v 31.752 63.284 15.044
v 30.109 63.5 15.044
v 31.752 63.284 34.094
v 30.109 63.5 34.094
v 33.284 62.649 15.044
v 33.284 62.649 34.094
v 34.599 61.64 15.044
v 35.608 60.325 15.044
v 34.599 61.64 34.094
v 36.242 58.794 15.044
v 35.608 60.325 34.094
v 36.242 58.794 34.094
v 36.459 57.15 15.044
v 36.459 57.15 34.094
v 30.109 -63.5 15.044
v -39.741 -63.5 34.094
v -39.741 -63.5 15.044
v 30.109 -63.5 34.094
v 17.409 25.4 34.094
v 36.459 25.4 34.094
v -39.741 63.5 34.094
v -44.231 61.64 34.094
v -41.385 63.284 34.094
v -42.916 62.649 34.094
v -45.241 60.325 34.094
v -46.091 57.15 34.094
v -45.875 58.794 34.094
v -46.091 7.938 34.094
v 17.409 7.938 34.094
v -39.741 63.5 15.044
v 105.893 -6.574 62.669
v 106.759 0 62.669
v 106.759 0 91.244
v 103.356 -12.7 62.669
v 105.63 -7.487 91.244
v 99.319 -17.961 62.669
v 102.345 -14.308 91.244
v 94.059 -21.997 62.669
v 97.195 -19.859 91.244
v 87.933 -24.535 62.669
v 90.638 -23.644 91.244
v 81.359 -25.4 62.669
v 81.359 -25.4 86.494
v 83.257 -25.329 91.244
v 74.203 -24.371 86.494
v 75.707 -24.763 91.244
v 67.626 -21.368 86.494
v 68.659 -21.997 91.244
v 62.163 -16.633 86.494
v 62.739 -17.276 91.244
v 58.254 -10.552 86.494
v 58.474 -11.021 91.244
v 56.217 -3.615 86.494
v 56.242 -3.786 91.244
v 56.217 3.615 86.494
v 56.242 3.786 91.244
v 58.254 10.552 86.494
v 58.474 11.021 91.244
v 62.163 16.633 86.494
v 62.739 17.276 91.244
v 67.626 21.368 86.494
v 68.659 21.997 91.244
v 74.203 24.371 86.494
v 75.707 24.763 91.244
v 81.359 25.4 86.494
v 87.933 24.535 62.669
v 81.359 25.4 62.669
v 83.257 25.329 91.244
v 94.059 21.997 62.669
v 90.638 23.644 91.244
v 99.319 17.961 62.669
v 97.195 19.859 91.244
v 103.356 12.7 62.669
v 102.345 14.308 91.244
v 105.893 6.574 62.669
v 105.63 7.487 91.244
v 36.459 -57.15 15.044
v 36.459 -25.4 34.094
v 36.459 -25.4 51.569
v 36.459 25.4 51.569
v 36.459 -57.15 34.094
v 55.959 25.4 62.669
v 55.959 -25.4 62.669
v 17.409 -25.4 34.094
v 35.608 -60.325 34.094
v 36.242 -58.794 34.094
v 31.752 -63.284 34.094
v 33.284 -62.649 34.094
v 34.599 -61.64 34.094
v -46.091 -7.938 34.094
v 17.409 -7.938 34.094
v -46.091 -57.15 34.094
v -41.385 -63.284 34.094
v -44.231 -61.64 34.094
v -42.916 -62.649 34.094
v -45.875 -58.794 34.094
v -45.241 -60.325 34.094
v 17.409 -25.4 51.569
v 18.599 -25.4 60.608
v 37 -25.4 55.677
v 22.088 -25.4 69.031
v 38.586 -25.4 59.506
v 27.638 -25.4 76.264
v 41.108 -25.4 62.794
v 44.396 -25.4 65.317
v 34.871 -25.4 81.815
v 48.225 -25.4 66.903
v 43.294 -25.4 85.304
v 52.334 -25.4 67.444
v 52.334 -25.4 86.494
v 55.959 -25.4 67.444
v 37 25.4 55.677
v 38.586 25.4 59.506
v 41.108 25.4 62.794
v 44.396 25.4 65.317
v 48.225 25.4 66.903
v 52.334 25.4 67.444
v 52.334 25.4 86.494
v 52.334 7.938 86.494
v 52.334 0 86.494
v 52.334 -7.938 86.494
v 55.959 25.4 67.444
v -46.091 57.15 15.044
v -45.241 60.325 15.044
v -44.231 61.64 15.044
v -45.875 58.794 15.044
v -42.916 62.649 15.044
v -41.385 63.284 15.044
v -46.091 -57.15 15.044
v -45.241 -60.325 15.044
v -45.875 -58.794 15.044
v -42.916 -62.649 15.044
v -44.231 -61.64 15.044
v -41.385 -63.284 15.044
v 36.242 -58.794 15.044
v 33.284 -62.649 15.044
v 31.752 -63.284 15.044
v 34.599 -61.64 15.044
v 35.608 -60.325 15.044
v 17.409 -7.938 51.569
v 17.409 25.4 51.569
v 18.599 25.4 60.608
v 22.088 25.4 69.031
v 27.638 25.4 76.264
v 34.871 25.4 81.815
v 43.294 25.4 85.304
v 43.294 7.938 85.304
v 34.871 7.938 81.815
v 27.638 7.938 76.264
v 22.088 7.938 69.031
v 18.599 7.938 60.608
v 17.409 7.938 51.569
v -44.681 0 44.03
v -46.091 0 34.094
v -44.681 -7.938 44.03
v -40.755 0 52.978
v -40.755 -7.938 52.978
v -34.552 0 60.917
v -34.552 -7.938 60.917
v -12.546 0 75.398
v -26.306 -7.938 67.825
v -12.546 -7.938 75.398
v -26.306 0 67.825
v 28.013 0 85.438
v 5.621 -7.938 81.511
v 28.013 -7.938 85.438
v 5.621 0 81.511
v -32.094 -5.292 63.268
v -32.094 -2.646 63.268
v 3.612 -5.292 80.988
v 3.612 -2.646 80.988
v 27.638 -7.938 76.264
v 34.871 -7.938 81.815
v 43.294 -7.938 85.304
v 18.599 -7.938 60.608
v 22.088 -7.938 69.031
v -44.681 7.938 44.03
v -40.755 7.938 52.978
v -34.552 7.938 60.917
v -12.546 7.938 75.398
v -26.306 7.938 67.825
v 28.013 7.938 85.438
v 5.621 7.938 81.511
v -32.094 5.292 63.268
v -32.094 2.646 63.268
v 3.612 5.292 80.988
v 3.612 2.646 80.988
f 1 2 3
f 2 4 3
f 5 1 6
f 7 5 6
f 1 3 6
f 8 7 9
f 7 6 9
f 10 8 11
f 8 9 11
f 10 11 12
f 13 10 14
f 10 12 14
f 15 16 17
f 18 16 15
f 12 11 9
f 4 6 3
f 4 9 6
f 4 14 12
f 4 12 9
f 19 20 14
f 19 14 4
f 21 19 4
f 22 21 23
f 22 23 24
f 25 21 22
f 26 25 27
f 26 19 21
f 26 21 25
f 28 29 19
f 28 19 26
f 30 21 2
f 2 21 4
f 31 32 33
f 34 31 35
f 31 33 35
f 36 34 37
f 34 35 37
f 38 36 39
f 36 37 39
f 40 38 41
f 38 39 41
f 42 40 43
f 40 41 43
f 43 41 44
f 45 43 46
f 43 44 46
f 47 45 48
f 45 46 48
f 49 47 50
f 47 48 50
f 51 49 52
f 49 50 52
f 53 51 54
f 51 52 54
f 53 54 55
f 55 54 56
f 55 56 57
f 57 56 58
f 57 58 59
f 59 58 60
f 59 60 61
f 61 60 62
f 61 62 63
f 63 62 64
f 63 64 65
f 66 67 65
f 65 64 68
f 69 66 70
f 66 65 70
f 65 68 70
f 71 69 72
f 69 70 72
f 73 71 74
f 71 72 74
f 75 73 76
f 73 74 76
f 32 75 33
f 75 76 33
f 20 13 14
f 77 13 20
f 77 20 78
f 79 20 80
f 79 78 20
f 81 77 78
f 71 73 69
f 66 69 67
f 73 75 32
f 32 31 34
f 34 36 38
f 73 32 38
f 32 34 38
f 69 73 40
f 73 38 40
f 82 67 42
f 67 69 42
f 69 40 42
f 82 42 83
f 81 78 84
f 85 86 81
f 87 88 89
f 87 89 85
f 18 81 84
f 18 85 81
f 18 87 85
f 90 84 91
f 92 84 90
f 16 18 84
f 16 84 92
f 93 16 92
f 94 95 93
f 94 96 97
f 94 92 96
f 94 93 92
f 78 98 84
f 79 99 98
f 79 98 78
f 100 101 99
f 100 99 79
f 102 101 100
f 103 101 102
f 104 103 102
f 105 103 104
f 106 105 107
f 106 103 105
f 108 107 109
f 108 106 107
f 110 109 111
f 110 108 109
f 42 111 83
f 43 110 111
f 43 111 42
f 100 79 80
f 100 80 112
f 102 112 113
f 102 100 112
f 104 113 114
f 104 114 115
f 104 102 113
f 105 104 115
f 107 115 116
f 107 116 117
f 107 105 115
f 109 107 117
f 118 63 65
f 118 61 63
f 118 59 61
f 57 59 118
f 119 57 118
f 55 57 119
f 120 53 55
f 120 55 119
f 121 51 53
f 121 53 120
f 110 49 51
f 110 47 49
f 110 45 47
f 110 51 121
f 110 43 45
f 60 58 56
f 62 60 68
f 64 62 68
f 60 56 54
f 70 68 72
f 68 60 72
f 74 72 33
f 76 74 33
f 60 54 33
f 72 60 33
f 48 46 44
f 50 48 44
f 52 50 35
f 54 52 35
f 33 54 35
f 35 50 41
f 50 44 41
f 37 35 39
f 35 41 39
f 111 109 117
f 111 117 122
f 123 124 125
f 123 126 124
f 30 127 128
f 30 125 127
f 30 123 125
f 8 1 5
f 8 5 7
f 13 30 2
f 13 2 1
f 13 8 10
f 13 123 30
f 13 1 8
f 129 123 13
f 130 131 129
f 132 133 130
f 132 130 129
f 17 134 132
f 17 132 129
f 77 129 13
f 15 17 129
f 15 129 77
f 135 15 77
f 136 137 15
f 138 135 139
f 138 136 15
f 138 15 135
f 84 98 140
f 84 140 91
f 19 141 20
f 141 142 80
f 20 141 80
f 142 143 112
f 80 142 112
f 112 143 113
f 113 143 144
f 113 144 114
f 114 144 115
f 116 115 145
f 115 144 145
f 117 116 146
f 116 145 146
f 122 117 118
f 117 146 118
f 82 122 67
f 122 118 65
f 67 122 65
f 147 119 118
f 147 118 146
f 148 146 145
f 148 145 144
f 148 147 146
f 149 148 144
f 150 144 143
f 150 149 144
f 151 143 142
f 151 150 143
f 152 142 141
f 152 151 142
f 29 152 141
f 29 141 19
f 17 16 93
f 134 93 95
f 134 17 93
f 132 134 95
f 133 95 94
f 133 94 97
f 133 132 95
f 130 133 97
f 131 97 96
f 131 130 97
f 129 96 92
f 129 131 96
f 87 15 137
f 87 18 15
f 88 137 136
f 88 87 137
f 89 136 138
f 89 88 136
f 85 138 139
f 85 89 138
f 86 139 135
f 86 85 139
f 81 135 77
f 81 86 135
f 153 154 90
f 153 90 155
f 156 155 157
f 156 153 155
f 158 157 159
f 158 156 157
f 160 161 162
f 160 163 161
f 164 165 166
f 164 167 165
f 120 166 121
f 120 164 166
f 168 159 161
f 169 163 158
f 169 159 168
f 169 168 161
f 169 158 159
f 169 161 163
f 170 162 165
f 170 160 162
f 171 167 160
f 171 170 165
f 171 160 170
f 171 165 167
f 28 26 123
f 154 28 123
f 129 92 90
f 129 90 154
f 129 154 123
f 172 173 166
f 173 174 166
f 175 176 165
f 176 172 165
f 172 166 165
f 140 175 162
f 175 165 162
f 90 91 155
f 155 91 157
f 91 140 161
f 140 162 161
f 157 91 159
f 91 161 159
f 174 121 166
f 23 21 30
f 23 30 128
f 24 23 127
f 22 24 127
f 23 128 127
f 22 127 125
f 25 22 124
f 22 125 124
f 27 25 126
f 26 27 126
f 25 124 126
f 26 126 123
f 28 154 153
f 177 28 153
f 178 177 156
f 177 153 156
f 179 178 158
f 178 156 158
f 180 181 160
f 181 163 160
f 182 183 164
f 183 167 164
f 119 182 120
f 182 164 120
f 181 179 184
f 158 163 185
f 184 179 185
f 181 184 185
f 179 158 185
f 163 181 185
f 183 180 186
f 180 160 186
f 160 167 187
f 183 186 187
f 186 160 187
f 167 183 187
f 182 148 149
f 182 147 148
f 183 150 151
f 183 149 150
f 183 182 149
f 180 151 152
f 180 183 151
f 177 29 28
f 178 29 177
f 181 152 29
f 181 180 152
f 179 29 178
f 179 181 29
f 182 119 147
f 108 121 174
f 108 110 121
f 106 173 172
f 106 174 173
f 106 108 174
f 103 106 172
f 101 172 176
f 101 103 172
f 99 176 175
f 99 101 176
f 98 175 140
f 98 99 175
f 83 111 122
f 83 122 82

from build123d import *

# Parameters (mm, degrees)
F1_DEPTH = 63.5
F2_DEPTH = 25.4
F3_DEPTH = 7.9375
F5_R     = 6.35


with BuildPart() as f1:
    # F0 (on Front) → F1 (new body, symmetric)
    with BuildSketch(Plane.XZ):
        Polygon((-46.0913150109, 34.0935156439), (-46.0913150109, 15.0435156439), (36.4586849891, 15.0435156439), (36.4586849891, 34.0935156439), (17.4086849891, 34.0935156439), align=None)
    extrude(amount=F1_DEPTH, both=True)

    # F0 (on Front) → F2 (join, symmetric)
    with BuildSketch(Plane.XZ):
        with BuildLine():
            Line((17.4086849891, 34.0935156439), (36.4586849891, 34.0935156439))
            Line((36.4586849891, 34.0935156439), (36.4586849891, 51.5687156439))
            ThreePointArc((36.4586849891, 51.5687156439), (41.1083648378, 62.7940357952), (52.3336849891, 67.4437156439))
            Line((52.3336849891, 67.4437156439), (55.9586890934, 67.4437156439))
            Line((55.9586890934, 67.4437156439), (55.9586890934, 86.4937156439))
            Line((55.9586890934, 86.4937156439), (52.3336849891, 86.4937156439))
            ThreePointArc((52.3336849891, 86.4937156439), (27.6379806562, 76.2644199768), (17.4086849891, 51.5687156439))
            Line((17.4086849891, 51.5687156439), (17.4086849891, 34.0935156439))
        make_face()
        Polygon((81.3586890934, 86.4937156439), (55.9586890934, 86.4937156439), (55.9586890934, 67.4437156439), (55.9586890934, 62.6685156439), (81.3586890934, 62.6685156439), align=None)
    extrude(amount=F2_DEPTH, both=True)

    # F0 (on Front) → F3 (join, symmetric)
    with BuildSketch(Plane.XZ):
        with BuildLine():
            add(Edge.make_bspline(
                [(-46.0913150109, 34.0935156439), (-45.8442233503, 68.7412694097), (0, 87.3479917645), (52.3336849891, 86.4937156439)],
                knots=[0, 0, 0, 0, 111.5045361635, 111.5045361635, 111.5045361635, 111.5045361635], degree=3))
            Line((-46.0913150109, 34.0935156439), (17.4086849891, 34.0935156439))
            Line((17.4086849891, 34.0935156439), (17.4086849891, 51.5687156439))
            ThreePointArc((17.4086849891, 51.5687156439), (27.6379806562, 76.2644199768), (52.3336849891, 86.4937156439))
        make_face()
    extrude(amount=F3_DEPTH, both=True)

    # F0 (on Front) → F4 (revolve)
    with BuildSketch(Plane.XZ):
        Polygon((81.3586890934, 91.2435156439), (81.3586890934, 86.4937156439), (81.3586890934, 62.6685156439), (106.7586890934, 62.6685156439), (106.7586890934, 91.2435156439), align=None)
    revolve(axis=Axis((81.3586890934, 0, 76.9560156439), (0, 0, -1)))

    # F5
    f5_edges = [f1.edges().sort_by_distance(p)[0] for p in [
        (36.458685, -63.5, 24.568516),
        (-46.091315, -63.5, 24.568516),
        (36.458685, 63.5, 24.568516),
        (-46.091315, 63.5, 24.568516),
    ]]
    fillet(f5_edges, radius=F5_R)


solid = f1.part
